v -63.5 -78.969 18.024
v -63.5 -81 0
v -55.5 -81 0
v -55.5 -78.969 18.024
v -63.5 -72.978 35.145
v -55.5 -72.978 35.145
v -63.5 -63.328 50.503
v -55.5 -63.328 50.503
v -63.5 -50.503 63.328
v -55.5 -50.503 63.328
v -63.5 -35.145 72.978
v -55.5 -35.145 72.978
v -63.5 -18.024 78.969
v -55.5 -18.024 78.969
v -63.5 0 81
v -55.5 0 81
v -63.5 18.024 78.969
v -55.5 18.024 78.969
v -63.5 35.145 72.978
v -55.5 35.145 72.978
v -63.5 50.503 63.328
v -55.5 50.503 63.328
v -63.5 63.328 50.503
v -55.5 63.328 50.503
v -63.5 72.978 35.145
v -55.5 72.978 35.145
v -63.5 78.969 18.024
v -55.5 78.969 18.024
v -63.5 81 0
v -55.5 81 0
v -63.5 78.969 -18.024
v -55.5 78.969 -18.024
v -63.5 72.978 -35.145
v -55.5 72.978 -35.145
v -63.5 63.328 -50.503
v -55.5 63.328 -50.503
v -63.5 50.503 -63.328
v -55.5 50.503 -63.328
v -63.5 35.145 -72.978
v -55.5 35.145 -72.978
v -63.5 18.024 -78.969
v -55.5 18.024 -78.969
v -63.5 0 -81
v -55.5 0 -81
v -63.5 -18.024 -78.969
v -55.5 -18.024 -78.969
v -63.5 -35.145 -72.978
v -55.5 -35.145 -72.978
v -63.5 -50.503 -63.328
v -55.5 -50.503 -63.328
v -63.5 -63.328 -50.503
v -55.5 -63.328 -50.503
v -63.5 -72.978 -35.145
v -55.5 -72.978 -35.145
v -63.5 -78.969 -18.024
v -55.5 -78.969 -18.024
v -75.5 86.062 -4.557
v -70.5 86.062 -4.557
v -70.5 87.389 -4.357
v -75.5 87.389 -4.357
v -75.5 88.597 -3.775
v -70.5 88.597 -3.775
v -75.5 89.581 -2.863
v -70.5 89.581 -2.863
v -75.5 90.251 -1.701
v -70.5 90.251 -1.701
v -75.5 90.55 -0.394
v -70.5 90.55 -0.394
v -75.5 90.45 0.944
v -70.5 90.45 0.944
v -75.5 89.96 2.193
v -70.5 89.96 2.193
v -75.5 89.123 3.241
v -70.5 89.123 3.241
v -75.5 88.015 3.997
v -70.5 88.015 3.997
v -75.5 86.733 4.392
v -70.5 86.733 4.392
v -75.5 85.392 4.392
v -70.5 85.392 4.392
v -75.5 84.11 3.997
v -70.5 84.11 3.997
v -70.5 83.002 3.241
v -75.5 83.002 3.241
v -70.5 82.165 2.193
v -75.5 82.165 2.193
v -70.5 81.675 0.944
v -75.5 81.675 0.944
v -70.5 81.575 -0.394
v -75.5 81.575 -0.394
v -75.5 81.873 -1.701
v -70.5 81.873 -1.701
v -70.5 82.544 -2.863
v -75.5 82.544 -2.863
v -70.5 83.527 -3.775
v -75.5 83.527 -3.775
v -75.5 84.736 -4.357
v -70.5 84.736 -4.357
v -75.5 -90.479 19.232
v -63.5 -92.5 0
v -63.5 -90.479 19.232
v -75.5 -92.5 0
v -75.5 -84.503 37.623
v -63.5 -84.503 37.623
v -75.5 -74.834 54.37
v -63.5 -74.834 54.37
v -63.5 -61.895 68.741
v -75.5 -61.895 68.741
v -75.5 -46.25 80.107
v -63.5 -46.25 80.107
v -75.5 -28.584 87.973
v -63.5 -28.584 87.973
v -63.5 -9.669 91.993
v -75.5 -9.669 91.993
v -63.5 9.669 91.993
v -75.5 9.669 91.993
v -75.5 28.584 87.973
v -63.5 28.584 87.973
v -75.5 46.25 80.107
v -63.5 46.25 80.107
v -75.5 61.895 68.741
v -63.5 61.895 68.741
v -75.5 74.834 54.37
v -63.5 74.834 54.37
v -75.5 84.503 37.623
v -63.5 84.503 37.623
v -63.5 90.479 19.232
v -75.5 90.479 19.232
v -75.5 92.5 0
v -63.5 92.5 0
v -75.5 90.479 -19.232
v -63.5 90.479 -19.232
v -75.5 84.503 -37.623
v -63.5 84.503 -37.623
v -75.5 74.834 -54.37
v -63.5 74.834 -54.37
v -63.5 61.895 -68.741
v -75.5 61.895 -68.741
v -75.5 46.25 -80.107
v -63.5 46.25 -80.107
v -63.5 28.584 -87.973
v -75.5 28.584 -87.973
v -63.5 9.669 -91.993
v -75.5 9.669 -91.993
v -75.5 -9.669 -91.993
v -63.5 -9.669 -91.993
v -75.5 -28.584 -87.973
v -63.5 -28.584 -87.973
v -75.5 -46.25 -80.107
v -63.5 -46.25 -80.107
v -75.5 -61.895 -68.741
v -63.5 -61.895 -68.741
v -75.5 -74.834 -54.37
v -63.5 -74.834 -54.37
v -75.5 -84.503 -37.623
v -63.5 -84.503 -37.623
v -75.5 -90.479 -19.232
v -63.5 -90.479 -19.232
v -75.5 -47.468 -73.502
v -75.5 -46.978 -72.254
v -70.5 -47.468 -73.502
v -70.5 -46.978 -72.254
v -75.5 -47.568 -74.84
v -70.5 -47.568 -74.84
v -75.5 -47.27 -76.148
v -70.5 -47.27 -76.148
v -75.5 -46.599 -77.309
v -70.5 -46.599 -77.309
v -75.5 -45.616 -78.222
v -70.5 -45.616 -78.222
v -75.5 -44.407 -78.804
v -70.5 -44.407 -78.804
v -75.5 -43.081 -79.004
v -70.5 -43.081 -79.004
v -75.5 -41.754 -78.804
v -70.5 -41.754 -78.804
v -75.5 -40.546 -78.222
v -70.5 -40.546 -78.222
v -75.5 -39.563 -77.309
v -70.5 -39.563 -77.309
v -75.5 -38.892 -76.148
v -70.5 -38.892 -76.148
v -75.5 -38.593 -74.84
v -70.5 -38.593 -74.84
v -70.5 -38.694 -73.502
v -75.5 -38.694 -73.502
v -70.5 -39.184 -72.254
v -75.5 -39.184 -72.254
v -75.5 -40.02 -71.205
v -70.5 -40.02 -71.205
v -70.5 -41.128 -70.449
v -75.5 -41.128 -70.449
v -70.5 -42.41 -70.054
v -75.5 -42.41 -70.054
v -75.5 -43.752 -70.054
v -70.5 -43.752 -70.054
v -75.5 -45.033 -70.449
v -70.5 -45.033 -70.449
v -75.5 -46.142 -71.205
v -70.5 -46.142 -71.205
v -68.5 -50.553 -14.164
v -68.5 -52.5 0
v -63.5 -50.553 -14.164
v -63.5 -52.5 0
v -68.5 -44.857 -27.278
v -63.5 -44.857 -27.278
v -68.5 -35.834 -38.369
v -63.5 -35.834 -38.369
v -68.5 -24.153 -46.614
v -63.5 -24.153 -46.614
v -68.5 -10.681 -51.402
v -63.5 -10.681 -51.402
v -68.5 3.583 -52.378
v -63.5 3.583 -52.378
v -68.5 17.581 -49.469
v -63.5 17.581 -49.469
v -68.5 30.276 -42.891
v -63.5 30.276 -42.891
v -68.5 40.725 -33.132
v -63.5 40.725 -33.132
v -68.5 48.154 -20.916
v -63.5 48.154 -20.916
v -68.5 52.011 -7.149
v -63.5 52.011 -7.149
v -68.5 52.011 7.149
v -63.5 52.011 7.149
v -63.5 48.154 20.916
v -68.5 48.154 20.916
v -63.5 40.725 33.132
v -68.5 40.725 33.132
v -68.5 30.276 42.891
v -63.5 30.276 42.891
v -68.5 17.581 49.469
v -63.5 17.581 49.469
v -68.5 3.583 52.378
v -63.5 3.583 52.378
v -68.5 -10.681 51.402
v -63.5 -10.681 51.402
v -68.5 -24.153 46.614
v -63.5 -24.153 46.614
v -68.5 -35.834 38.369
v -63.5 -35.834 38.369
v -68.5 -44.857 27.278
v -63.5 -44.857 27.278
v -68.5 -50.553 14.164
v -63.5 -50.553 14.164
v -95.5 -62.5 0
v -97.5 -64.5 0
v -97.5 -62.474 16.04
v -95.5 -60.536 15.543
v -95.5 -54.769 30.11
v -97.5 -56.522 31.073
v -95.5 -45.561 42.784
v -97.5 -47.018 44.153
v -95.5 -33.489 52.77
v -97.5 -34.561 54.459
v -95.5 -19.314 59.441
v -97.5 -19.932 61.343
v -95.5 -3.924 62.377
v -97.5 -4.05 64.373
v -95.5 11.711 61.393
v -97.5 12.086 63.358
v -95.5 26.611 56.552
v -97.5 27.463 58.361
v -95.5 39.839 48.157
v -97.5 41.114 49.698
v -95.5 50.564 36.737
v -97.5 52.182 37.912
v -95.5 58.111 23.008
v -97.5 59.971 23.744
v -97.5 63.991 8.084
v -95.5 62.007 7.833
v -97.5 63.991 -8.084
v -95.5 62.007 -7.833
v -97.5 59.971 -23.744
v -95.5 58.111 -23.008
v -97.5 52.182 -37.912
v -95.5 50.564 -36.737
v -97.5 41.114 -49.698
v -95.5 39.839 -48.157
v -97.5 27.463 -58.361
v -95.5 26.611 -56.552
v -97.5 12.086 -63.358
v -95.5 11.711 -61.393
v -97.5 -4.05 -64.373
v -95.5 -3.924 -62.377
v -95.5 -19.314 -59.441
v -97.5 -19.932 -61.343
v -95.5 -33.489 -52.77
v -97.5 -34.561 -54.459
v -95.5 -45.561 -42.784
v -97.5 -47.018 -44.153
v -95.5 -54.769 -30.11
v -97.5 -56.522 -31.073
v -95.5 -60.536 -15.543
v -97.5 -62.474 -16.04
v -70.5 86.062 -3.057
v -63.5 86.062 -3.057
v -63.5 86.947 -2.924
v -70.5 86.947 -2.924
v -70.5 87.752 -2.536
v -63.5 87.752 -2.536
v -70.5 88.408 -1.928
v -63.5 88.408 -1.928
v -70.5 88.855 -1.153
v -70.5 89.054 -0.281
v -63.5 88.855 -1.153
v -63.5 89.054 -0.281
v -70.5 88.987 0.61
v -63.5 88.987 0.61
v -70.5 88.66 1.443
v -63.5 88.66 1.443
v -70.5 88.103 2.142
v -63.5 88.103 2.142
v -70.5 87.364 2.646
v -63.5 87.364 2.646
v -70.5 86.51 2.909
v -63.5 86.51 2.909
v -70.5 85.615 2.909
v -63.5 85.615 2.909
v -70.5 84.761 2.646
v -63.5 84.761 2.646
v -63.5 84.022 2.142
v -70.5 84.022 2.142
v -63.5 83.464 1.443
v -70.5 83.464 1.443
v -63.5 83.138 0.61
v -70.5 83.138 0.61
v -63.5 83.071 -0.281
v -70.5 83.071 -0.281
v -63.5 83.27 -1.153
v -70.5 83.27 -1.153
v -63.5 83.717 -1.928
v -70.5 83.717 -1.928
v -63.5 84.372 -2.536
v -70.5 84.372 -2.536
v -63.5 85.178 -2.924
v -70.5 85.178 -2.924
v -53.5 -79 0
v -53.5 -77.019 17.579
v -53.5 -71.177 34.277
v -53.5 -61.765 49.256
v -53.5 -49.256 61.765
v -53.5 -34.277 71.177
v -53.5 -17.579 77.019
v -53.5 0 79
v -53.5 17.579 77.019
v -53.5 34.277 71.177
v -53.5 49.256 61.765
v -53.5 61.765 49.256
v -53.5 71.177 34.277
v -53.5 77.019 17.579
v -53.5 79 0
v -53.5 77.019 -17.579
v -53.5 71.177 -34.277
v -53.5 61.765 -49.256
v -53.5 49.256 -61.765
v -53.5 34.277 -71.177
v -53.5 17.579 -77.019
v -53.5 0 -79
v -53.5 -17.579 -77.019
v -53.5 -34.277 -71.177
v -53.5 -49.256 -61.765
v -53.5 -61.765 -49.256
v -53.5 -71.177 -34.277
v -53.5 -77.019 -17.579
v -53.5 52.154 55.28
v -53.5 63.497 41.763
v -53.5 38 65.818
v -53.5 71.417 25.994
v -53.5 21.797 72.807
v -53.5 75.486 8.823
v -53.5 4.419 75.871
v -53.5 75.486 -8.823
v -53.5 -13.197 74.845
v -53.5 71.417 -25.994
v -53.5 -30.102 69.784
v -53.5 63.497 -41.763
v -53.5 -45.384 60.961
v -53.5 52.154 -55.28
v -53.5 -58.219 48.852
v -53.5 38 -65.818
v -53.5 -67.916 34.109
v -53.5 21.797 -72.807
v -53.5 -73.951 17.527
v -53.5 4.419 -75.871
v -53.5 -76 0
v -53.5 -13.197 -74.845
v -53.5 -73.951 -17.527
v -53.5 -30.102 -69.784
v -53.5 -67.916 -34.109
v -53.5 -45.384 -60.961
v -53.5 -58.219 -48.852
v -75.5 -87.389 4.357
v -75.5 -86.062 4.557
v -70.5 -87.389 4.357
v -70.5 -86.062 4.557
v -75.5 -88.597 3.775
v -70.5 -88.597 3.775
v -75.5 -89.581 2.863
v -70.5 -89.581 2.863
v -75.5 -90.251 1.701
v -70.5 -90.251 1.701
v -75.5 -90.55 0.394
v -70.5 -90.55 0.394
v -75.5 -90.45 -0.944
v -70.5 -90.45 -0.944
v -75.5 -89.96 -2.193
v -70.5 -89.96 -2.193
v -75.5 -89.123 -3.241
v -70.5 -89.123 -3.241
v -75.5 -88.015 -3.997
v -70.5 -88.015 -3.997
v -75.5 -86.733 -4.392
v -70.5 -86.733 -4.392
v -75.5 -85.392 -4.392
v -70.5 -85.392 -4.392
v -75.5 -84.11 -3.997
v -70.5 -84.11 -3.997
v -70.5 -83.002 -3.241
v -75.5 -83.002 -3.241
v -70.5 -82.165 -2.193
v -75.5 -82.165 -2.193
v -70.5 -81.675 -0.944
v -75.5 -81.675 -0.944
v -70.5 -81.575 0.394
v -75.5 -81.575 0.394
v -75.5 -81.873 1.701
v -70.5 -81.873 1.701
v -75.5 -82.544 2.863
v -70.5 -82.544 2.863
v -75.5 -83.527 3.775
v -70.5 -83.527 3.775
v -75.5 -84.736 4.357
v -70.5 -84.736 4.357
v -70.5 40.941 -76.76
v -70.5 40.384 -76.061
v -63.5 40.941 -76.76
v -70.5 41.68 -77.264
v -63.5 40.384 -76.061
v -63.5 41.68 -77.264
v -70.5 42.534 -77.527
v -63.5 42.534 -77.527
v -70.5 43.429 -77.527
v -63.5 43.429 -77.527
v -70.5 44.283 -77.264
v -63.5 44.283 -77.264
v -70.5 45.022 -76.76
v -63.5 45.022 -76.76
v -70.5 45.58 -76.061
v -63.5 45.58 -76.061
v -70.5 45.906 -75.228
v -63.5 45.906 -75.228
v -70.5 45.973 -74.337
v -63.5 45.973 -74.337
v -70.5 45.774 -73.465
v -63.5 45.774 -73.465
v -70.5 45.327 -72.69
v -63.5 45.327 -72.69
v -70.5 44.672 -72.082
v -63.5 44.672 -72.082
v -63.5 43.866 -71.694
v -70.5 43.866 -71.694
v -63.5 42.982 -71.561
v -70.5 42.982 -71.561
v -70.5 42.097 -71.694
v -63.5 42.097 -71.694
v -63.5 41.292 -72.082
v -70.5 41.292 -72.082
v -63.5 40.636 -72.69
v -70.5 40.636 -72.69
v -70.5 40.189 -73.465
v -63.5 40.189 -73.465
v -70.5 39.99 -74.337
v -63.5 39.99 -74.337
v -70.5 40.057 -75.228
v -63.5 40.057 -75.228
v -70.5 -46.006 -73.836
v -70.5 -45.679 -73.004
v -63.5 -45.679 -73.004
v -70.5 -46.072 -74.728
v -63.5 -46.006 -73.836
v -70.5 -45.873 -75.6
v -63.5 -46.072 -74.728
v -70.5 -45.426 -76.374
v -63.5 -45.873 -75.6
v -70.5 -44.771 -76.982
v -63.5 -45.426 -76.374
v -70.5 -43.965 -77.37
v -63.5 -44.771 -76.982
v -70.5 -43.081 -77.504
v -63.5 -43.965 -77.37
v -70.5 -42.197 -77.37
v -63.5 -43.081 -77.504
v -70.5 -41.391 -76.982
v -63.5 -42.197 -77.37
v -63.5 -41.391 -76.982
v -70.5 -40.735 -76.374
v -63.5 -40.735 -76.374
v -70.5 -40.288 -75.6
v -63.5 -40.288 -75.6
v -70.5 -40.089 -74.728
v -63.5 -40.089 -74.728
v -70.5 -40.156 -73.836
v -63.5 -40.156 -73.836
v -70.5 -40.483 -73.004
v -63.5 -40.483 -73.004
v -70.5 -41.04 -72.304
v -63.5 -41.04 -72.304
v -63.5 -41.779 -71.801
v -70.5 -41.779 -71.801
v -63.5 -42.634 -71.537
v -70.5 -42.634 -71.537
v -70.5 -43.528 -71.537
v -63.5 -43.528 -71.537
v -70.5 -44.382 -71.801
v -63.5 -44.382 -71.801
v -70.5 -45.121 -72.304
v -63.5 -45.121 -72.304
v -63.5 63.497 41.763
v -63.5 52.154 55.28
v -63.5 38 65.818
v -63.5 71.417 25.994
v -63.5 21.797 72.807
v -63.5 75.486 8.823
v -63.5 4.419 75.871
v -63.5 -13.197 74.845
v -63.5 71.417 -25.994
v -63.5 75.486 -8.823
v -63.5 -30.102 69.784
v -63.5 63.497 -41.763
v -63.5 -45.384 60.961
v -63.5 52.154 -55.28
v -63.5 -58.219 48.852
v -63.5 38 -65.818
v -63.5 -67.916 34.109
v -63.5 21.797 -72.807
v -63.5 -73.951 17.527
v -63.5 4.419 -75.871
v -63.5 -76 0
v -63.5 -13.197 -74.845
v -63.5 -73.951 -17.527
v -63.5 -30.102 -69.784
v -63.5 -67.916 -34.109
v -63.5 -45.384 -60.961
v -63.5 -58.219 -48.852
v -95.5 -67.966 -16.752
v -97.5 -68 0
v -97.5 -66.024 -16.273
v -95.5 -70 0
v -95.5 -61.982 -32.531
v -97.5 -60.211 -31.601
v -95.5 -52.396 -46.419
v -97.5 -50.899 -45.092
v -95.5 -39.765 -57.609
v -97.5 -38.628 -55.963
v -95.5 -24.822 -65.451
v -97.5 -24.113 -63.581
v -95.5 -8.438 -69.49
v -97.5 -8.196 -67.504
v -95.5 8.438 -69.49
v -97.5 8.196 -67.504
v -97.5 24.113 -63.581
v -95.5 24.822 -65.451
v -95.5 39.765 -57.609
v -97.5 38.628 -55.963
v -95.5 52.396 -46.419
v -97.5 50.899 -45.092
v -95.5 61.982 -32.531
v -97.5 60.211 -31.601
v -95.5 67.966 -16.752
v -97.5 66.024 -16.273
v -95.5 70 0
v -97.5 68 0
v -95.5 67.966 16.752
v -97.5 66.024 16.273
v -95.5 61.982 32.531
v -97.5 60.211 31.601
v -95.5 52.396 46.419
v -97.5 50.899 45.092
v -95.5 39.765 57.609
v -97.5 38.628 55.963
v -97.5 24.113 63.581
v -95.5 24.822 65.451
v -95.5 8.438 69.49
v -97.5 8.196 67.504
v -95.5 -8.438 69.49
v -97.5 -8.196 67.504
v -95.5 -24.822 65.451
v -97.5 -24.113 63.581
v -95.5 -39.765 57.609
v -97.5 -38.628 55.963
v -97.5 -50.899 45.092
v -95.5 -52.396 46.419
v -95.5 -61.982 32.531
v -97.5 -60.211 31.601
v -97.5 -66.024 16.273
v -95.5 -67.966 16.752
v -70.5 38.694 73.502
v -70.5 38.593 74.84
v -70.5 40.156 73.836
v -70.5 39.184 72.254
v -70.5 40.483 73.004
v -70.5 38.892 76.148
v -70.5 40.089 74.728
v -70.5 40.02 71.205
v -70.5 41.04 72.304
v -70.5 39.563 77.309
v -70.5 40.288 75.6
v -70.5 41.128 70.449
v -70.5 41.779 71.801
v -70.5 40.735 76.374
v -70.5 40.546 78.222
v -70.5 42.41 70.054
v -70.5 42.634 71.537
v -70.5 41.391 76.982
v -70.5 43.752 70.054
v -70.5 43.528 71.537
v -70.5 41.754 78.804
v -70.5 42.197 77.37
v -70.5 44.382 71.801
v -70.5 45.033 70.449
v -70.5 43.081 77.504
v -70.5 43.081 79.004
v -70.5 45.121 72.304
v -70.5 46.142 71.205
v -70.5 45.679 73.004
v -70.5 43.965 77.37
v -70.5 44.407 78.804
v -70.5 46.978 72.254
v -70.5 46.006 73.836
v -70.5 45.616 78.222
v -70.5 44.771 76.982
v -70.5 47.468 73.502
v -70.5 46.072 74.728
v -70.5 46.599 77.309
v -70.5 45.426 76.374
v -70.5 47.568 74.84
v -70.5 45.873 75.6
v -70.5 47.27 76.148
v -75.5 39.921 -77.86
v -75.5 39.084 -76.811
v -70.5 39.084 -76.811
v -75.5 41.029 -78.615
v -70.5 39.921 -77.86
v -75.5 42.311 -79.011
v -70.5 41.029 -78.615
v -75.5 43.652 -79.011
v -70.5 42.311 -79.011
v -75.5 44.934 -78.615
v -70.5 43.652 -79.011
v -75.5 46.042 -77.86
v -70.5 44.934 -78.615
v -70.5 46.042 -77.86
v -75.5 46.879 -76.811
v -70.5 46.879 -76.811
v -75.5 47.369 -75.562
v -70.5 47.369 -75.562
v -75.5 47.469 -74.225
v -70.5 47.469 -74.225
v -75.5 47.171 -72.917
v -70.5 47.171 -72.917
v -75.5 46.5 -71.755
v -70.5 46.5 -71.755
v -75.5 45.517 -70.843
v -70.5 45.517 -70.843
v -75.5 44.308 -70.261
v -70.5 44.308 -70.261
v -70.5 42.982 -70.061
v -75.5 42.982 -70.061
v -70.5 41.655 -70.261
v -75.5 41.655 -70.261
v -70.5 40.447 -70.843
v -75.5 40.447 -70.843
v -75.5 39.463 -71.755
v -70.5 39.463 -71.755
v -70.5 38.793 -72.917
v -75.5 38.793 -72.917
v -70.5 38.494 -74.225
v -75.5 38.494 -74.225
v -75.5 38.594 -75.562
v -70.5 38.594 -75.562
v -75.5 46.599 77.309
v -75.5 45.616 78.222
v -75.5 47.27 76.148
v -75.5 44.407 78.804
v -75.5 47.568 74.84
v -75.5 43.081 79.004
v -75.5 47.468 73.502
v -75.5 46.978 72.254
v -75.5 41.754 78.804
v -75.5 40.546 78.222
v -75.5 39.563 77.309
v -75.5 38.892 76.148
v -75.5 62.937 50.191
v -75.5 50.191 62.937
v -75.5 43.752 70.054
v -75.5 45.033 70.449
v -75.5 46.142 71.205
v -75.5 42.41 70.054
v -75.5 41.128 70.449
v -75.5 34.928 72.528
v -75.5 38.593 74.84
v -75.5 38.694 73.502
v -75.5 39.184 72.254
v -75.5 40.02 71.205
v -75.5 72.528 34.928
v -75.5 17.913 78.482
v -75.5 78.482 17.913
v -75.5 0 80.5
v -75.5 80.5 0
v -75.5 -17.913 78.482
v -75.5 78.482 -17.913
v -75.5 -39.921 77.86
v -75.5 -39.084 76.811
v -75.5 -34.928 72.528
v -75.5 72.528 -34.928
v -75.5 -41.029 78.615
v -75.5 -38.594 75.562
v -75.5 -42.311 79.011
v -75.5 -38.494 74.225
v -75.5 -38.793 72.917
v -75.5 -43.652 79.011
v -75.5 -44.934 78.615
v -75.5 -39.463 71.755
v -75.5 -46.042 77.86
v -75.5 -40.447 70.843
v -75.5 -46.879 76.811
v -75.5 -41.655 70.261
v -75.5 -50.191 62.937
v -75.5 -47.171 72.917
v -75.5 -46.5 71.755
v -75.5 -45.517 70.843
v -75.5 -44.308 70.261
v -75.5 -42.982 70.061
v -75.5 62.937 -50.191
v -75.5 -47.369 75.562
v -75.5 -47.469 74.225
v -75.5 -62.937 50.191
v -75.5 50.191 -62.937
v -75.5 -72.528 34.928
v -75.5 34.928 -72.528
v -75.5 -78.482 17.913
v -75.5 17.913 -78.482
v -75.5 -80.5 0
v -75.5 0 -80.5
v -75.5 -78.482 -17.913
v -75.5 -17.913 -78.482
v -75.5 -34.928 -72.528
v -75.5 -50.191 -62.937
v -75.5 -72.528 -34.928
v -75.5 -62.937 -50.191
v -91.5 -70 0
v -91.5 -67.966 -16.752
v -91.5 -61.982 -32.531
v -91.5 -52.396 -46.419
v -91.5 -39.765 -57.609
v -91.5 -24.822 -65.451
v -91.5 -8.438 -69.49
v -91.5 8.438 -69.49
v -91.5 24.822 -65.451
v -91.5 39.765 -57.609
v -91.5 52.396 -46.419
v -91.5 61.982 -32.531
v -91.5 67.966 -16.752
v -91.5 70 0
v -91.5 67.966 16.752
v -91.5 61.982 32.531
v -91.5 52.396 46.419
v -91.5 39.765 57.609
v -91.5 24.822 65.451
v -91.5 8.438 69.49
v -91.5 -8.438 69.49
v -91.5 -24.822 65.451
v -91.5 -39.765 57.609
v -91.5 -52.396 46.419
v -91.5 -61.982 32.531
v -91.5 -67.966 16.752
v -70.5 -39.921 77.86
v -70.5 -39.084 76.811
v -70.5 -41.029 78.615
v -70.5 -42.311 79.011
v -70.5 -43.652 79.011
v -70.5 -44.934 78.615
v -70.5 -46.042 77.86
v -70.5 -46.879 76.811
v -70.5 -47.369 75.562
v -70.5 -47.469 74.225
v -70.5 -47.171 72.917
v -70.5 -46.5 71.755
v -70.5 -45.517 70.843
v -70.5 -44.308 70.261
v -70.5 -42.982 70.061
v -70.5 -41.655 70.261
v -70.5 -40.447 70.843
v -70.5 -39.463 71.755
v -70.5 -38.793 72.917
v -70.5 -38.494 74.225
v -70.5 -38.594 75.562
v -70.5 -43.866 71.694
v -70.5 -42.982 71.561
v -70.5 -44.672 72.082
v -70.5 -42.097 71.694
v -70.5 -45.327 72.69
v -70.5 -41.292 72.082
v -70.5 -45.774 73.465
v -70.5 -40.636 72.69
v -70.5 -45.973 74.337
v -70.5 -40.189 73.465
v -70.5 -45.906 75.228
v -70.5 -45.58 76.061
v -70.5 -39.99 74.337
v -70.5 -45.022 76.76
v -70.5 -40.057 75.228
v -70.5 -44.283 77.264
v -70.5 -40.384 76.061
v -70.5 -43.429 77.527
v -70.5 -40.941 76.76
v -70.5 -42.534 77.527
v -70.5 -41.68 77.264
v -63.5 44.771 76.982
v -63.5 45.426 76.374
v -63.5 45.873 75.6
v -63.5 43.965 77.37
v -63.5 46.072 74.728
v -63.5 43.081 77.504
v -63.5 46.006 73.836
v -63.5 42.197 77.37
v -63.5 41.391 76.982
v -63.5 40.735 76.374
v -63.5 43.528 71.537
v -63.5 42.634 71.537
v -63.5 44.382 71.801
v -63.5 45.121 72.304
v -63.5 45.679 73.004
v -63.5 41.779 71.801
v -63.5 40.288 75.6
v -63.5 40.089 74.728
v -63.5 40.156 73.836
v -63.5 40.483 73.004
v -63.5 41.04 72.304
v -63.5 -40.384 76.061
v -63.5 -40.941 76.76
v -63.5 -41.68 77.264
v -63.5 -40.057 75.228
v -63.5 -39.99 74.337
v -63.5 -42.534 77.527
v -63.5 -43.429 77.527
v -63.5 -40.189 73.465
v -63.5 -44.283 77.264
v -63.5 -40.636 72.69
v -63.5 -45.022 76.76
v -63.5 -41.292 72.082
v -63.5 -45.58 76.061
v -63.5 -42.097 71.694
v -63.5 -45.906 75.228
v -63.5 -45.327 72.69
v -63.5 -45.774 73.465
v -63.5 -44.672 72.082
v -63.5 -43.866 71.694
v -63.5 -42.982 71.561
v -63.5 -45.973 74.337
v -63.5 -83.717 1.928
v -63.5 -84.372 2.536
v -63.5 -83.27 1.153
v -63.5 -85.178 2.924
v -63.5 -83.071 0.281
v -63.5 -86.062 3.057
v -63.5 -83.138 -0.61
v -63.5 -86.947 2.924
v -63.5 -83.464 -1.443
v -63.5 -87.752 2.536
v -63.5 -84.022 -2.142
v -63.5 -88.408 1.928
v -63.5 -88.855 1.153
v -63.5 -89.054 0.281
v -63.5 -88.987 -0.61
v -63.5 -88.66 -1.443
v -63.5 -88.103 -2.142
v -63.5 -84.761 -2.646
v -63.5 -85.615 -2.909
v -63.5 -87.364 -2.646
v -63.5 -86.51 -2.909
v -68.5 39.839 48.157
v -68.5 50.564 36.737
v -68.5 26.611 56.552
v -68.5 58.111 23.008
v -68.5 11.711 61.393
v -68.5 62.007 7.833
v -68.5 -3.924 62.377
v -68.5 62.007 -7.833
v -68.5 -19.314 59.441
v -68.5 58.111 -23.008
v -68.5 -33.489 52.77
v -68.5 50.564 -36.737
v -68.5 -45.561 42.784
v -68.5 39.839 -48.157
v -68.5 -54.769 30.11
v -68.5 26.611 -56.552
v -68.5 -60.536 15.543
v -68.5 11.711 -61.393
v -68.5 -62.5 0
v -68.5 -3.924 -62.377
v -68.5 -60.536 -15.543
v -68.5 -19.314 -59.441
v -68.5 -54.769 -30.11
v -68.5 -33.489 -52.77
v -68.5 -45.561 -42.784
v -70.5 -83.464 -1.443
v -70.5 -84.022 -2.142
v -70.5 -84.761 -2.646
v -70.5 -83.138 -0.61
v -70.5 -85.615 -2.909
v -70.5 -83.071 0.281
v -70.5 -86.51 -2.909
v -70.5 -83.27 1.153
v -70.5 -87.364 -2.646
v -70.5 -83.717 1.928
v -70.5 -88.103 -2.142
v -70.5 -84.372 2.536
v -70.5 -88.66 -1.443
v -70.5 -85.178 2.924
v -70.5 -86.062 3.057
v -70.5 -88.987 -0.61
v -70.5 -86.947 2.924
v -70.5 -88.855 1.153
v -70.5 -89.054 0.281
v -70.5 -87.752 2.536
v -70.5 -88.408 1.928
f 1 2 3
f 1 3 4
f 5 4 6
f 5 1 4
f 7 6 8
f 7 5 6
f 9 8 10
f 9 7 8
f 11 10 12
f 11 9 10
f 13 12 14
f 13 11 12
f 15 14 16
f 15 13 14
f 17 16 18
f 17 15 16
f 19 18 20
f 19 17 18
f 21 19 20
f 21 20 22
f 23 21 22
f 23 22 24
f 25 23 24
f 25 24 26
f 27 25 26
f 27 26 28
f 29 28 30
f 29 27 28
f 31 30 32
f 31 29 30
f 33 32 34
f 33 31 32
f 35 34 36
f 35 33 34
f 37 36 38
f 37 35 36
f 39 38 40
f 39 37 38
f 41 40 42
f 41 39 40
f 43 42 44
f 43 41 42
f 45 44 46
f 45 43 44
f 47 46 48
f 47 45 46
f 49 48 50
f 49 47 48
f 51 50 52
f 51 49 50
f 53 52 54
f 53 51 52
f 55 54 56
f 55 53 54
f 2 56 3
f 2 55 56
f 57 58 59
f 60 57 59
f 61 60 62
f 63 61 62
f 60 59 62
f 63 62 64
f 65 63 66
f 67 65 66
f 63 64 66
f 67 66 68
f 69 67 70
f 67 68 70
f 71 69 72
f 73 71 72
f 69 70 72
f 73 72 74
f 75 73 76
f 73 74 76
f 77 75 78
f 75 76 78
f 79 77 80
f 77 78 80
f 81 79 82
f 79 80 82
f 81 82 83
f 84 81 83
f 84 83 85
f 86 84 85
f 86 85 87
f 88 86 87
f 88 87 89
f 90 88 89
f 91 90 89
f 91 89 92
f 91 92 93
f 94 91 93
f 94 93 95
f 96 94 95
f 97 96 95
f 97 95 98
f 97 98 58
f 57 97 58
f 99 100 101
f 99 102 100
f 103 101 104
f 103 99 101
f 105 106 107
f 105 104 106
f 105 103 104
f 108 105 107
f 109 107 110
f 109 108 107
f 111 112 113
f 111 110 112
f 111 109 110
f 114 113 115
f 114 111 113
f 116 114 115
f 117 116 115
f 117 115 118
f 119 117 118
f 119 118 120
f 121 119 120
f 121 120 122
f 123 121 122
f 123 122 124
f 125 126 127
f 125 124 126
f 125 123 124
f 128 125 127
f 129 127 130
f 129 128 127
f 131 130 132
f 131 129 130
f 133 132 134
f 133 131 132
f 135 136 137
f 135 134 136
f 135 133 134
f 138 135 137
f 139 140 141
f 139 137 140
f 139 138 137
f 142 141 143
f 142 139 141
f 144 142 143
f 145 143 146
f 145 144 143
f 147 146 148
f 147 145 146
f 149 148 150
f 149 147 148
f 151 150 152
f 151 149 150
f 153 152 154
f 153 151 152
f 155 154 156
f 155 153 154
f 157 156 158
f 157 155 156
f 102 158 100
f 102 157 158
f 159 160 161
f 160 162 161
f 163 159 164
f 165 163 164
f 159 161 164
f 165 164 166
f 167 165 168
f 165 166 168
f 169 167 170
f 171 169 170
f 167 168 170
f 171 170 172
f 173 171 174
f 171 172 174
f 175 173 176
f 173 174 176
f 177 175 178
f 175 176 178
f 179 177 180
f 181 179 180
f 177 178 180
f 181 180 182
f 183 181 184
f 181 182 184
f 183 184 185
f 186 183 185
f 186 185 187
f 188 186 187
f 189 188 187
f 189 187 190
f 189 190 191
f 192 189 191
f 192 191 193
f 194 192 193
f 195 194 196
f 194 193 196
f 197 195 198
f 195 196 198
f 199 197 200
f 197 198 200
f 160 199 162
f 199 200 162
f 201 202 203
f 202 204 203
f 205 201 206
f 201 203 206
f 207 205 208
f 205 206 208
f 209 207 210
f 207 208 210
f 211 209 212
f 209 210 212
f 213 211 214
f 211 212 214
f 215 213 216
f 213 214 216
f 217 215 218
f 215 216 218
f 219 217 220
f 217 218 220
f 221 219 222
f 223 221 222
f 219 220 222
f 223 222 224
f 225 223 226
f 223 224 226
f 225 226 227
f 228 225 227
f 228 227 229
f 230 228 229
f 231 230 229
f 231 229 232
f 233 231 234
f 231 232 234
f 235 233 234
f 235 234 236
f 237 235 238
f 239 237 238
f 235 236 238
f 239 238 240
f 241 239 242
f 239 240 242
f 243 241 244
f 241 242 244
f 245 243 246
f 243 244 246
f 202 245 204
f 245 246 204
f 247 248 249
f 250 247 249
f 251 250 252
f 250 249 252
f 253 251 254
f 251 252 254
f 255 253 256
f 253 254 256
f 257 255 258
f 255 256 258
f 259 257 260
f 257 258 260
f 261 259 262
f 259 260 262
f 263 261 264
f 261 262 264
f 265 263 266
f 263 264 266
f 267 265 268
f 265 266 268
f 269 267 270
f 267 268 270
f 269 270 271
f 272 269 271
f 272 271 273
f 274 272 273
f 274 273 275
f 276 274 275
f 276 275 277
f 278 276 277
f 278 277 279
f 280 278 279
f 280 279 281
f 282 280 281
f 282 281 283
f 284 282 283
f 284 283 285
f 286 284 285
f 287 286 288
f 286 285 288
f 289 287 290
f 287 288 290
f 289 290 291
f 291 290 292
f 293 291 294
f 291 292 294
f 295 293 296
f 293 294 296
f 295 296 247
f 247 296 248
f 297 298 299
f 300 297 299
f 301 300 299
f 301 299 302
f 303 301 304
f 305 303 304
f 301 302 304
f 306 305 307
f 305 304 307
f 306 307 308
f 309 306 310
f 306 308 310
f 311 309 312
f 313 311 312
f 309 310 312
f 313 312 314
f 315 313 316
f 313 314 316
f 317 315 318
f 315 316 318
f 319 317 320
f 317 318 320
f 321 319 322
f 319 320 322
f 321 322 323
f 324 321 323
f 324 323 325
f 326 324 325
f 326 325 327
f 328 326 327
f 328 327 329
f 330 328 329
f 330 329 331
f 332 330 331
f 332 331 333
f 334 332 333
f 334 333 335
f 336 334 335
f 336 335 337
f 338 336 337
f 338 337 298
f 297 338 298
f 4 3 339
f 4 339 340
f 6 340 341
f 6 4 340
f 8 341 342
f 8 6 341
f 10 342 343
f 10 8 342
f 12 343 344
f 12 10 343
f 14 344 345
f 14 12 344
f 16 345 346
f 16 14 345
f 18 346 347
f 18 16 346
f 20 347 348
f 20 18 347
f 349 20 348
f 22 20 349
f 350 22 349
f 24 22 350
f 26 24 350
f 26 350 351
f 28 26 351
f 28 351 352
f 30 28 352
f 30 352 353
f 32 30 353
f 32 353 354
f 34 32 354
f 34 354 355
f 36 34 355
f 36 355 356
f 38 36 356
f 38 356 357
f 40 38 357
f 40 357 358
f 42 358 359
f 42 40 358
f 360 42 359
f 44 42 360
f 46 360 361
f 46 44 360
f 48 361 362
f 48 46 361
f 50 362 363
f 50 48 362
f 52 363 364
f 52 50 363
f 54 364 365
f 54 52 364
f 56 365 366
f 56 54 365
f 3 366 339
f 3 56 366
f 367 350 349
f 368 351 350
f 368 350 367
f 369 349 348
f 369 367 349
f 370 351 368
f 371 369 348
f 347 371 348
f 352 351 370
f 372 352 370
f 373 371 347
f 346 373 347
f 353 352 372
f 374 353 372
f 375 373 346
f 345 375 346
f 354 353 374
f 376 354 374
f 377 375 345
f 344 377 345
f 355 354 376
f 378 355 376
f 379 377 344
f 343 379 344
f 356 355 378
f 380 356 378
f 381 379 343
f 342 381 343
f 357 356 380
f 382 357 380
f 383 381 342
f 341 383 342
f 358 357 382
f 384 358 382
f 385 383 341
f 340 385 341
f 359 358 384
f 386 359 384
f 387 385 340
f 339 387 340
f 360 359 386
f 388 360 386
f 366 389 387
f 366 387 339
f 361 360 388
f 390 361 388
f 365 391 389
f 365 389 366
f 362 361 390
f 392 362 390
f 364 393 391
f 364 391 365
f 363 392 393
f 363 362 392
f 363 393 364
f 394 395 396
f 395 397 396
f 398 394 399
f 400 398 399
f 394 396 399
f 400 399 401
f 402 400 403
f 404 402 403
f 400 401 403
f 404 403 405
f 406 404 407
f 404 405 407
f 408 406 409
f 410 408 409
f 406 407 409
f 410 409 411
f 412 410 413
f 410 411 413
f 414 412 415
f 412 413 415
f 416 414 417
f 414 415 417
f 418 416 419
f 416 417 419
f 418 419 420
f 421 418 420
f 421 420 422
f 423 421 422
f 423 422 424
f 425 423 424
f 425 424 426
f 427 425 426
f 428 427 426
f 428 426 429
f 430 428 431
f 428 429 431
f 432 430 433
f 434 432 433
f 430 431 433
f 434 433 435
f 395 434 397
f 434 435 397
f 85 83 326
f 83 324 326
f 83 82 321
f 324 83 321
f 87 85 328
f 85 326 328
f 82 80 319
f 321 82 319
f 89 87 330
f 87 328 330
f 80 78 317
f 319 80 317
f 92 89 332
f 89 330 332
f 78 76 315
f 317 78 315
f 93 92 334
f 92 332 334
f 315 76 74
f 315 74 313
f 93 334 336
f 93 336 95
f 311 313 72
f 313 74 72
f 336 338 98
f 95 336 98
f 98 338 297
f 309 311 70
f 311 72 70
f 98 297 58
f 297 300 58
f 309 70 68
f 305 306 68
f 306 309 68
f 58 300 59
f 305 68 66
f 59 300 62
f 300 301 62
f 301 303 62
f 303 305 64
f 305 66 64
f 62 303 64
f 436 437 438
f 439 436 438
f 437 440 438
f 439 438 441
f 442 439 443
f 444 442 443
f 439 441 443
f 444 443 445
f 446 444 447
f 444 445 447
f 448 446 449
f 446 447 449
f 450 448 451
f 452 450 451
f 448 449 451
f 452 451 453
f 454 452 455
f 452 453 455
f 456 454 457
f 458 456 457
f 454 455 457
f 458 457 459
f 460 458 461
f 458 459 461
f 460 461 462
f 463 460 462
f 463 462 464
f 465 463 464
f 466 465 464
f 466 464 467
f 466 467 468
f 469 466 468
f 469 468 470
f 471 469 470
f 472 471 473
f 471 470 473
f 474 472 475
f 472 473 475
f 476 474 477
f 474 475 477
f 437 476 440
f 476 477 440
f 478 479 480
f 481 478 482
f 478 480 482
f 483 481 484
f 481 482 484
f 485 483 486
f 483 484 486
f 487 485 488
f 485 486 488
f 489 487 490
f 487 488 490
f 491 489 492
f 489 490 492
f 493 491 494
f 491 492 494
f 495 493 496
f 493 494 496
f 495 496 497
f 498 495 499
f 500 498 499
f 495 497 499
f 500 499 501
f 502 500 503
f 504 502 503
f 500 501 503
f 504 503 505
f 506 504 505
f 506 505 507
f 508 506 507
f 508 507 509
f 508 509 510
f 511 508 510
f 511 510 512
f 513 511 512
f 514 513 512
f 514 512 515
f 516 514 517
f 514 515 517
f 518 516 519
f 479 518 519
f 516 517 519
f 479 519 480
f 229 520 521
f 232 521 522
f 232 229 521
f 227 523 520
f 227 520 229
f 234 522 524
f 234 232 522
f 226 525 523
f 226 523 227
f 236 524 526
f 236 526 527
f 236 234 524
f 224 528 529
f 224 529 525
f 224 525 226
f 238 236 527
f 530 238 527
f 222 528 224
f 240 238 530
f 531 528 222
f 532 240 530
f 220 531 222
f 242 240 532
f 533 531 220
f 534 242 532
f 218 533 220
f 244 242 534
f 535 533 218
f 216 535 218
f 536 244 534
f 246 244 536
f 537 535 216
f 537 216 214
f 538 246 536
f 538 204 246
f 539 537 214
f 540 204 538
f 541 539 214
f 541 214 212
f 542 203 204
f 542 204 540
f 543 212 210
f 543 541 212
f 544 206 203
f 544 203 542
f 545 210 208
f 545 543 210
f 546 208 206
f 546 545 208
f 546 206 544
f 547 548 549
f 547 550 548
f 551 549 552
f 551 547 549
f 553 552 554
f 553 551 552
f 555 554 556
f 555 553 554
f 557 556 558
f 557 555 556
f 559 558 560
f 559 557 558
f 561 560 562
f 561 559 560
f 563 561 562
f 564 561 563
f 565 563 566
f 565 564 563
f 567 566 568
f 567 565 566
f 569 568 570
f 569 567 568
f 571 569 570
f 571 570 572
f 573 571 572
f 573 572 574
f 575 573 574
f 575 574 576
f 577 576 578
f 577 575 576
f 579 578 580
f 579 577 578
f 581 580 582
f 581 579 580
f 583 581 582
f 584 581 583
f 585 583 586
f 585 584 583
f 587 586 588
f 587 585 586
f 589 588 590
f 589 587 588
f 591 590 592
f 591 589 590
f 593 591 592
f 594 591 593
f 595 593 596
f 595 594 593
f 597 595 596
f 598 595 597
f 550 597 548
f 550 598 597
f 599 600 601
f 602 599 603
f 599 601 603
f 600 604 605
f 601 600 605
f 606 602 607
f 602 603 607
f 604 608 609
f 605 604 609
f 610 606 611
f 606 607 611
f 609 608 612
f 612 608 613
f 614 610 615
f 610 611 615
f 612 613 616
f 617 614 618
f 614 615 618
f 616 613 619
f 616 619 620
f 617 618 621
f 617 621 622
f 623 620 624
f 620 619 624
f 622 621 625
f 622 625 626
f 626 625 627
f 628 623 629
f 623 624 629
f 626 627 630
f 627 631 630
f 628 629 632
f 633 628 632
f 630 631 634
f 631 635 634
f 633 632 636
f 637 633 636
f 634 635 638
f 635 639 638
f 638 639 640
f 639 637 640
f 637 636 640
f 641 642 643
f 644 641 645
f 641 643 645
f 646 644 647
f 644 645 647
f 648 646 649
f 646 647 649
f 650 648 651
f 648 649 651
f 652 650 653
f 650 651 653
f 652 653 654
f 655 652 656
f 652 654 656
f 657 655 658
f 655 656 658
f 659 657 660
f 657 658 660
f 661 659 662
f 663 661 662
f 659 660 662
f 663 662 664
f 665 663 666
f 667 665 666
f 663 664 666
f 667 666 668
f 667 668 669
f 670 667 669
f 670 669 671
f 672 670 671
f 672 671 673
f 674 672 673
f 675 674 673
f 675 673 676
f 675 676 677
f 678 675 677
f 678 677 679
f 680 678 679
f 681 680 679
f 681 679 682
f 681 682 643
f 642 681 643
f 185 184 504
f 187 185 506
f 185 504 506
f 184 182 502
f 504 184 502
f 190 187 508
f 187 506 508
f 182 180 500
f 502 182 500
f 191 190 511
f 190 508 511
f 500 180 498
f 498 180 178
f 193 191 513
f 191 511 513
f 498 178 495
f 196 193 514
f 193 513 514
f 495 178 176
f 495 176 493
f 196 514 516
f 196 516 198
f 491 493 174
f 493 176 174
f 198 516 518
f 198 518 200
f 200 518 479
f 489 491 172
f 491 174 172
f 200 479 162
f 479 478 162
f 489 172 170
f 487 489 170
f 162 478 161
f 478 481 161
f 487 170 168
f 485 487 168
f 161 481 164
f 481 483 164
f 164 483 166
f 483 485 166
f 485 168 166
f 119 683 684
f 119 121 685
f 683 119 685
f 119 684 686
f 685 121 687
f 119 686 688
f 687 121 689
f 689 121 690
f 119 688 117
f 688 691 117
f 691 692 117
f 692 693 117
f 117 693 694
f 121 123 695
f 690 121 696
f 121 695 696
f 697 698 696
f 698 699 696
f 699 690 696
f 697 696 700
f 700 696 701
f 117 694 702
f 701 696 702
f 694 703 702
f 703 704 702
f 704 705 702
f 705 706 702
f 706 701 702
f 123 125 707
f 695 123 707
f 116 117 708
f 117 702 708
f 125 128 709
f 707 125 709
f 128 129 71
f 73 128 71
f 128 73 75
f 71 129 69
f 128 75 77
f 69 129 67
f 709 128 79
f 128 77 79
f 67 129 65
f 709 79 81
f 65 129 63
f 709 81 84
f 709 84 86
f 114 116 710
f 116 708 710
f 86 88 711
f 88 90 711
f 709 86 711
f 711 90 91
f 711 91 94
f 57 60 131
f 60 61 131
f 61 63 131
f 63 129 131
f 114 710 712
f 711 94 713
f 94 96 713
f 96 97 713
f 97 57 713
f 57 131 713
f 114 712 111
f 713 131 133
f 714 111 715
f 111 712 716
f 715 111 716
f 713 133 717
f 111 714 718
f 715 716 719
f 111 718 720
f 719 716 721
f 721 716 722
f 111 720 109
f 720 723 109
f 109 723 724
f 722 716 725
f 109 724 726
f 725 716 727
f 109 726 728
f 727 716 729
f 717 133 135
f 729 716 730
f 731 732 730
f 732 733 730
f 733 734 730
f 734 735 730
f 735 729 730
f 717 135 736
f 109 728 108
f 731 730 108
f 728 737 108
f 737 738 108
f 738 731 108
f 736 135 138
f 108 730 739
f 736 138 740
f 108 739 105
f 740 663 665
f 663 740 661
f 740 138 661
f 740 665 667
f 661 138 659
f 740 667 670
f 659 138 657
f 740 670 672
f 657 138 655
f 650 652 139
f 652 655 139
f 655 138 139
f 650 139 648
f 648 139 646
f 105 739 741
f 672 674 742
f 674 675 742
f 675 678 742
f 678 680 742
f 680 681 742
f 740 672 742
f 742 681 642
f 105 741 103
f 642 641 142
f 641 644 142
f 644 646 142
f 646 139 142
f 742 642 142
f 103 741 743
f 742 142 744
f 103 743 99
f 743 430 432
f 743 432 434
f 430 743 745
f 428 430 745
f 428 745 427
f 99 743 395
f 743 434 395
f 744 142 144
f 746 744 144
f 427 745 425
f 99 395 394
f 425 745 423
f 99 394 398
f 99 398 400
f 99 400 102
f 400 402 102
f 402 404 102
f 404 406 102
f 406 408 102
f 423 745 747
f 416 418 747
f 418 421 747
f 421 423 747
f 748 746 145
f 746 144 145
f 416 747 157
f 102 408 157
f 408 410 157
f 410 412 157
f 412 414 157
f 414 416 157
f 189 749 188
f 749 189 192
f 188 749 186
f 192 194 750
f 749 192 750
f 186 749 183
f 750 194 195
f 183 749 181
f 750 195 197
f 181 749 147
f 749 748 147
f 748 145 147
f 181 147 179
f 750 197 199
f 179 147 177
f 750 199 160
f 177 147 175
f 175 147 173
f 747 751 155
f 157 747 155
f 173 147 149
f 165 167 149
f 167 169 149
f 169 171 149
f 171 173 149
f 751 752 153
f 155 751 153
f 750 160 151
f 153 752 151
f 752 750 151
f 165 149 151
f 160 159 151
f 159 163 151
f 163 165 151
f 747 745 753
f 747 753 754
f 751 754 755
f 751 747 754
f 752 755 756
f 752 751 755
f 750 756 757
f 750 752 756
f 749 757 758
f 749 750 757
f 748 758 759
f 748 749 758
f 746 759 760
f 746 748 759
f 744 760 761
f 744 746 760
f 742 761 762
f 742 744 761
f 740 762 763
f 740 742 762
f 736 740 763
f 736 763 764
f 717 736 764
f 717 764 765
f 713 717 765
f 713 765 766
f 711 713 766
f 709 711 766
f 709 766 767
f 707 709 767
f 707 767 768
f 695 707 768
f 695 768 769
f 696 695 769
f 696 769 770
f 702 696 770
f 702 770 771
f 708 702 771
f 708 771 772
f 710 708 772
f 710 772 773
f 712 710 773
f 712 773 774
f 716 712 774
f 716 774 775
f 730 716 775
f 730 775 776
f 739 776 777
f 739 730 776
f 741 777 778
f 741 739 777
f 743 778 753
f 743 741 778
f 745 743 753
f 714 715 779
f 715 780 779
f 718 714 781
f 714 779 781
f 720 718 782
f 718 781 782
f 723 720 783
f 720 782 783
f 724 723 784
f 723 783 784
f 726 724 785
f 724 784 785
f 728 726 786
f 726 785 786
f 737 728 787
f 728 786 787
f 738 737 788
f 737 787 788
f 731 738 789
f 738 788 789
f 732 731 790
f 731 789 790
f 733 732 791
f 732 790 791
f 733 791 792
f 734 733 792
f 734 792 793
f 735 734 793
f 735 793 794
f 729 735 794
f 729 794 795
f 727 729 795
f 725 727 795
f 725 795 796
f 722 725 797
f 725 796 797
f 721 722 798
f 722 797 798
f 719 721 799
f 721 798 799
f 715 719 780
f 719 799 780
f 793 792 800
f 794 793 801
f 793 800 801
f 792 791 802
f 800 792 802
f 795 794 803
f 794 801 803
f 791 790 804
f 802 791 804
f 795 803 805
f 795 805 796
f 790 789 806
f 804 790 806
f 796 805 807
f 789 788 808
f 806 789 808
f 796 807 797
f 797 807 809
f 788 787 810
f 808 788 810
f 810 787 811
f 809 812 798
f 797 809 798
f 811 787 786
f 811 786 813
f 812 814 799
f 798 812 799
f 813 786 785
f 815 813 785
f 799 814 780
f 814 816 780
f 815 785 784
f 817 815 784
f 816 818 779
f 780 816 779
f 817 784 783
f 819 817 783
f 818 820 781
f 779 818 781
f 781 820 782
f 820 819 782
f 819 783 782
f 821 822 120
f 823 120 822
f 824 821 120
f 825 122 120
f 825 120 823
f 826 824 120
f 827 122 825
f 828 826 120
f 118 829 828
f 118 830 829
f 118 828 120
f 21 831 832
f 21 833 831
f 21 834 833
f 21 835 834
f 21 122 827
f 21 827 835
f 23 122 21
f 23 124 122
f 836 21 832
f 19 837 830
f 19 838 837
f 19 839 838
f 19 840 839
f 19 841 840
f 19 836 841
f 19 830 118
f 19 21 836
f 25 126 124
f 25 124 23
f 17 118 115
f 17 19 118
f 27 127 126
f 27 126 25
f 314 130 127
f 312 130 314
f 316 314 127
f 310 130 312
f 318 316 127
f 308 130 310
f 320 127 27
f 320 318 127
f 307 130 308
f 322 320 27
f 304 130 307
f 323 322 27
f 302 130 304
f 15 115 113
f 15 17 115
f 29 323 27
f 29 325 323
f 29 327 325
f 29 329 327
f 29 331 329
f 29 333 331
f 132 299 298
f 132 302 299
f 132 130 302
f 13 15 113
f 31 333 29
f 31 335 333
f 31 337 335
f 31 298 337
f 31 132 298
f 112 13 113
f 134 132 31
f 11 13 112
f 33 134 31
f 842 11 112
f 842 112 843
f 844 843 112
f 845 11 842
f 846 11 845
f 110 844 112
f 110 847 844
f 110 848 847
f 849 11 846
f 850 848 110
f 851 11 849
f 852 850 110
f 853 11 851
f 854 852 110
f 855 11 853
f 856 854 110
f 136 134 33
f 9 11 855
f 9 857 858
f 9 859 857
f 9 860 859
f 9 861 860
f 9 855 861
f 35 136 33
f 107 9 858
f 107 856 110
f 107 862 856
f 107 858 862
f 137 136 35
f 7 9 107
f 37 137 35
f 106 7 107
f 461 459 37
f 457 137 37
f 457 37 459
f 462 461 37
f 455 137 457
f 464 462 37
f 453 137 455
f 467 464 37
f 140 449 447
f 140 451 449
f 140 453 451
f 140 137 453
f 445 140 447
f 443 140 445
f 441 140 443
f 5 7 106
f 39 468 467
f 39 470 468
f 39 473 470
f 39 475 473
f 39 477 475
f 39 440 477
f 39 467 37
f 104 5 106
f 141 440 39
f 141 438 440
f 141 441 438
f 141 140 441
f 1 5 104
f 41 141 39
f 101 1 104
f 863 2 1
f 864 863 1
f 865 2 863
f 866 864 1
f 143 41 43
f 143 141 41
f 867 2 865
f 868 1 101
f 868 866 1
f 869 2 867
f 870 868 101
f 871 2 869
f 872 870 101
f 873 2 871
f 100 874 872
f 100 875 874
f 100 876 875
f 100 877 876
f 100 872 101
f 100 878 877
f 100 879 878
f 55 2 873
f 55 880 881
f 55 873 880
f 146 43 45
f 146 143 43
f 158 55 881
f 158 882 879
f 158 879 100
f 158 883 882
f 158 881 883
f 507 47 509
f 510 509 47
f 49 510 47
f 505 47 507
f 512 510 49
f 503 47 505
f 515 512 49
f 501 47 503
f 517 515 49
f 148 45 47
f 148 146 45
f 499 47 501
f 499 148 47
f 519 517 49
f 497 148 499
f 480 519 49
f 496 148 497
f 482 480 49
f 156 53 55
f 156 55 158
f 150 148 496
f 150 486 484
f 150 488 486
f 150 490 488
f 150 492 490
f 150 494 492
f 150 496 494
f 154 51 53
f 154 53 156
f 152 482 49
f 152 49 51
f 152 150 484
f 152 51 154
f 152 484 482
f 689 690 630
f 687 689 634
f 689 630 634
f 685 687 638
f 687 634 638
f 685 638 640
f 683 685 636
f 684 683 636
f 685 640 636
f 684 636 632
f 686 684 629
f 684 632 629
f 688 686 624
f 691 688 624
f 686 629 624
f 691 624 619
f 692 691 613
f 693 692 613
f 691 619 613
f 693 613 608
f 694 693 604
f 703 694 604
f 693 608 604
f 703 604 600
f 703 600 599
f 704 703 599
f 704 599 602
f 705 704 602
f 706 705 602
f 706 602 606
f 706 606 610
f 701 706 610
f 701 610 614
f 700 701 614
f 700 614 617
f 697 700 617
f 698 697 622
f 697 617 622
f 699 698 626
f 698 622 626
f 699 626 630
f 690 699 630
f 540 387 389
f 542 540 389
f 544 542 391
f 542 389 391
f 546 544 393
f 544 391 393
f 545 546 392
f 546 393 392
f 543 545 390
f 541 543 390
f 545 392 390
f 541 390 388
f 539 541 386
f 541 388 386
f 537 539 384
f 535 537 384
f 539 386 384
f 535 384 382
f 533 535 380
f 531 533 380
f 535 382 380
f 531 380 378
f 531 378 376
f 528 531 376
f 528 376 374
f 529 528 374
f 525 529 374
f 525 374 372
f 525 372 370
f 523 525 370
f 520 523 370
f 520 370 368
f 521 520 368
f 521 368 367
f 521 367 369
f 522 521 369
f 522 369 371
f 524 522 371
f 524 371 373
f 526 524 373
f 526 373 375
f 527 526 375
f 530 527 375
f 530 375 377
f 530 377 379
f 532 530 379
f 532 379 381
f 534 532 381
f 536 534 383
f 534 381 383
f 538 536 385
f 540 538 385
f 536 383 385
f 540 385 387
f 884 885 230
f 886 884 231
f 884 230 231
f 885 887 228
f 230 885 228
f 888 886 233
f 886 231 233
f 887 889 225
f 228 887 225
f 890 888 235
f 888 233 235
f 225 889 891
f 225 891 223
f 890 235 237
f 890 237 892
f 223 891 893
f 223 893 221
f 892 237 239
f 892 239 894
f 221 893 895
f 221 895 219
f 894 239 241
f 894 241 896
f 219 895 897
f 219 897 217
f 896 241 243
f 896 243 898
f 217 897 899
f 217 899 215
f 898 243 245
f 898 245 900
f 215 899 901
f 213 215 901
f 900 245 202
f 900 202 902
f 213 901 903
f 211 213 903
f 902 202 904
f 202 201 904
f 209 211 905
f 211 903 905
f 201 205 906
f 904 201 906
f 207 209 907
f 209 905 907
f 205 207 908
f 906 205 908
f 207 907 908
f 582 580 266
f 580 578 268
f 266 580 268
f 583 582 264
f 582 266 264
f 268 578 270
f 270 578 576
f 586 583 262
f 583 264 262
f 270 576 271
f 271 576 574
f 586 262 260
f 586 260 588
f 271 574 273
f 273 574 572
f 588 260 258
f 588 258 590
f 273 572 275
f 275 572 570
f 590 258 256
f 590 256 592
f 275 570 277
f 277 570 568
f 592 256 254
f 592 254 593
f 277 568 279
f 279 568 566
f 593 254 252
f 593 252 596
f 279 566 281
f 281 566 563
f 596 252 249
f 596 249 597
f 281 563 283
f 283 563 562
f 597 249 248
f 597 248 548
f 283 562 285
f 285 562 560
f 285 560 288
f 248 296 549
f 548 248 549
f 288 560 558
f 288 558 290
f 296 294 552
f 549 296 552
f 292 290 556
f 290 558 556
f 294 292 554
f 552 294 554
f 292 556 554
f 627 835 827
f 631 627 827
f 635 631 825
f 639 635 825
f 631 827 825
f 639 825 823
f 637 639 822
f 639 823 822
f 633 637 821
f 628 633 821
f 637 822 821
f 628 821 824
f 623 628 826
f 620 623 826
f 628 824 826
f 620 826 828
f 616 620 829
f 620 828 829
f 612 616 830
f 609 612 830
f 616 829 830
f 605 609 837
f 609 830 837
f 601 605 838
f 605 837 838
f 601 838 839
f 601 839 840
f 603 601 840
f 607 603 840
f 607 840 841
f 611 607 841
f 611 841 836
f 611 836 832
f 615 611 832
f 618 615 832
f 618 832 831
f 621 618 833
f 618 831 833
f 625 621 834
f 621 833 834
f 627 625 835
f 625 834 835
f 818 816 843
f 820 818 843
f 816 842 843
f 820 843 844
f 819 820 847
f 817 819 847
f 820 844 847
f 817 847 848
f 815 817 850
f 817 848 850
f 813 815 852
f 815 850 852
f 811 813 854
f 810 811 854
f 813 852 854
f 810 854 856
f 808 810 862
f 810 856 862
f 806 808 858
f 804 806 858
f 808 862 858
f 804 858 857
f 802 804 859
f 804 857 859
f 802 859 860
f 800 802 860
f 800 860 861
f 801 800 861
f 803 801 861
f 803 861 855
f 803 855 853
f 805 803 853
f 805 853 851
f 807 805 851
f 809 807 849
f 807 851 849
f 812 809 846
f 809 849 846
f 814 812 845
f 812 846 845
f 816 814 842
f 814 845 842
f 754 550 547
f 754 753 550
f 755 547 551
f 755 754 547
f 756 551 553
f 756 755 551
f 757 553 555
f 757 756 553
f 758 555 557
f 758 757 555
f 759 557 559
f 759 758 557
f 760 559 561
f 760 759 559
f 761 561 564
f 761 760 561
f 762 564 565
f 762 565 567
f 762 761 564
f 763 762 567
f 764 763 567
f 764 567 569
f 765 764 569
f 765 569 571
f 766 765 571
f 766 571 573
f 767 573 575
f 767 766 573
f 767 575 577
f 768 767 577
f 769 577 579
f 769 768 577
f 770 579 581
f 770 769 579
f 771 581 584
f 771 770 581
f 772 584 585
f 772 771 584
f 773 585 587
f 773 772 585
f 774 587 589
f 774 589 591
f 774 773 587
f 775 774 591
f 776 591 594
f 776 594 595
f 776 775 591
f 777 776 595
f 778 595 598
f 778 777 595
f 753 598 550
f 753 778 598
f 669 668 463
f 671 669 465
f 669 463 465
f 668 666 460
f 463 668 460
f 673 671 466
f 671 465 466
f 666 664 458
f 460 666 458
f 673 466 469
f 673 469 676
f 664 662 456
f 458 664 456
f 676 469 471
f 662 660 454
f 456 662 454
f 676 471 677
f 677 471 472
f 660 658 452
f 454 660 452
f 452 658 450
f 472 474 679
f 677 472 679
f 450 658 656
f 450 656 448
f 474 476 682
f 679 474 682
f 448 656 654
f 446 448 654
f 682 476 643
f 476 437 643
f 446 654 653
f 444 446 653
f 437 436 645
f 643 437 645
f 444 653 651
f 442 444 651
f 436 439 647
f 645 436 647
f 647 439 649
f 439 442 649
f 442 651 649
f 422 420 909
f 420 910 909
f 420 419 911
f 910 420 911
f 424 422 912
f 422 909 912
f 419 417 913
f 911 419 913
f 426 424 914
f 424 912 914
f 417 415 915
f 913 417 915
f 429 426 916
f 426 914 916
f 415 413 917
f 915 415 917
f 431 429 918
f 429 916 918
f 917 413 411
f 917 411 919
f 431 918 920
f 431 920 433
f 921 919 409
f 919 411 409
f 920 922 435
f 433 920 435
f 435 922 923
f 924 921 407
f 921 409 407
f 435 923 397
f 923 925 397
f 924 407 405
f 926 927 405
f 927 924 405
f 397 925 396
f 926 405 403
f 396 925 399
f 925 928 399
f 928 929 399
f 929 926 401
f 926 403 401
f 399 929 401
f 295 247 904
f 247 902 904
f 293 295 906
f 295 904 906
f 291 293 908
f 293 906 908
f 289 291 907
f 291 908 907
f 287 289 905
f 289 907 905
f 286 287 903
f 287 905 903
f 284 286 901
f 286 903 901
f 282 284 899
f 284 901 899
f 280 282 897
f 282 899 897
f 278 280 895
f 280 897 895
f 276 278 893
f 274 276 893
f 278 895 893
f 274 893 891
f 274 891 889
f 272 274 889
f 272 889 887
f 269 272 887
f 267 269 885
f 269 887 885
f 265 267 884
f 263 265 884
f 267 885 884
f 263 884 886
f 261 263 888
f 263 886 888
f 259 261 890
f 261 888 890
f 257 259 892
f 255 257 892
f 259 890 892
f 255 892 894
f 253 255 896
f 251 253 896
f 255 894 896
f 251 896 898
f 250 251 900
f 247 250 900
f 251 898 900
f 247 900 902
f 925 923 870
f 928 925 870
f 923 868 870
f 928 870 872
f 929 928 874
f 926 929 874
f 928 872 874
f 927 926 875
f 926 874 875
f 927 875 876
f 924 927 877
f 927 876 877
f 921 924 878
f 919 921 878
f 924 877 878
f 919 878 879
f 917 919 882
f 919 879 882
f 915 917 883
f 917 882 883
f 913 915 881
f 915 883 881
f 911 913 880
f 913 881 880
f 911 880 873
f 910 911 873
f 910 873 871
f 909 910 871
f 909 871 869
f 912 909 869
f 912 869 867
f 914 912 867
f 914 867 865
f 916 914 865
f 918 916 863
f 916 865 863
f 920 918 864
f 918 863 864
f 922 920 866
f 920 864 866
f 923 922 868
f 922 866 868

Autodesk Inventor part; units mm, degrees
ref_plane "YZ Plane" through (0, 0, 0) normal (1, 0, 0) x (0, 1, 0)
ref_plane "XZ Plane" through (0, 0, 0) normal (0, 1, 0) x (-1, 0, 0)
ref_plane "XY Plane" through (0, 0, 0) normal (0, 0, 1) x (1, 0, 0)
sketch "Эскиз1" plane through (0, 0, 0) normal (0, 0, 1) x (1, 0, 0)
  line L0 (-63.5, -92.5) -> (-63.5, -81)
  line L1 (-63.5, -81) -> (-63.5, -92.5)
  line L2 (-75.5, -92.5) -> (-75.5, -80.5)
  line L3 (-97.5, -62.5) -> (-68.5, -62.5)
  line L4 (-68.5, -62.5) -> (-68.5, -52.5)
  line L5 (-68.5, -52.5) -> (-63.5, -52.5)
  line L6 (-63.5, -52.5) -> (-63.5, -76)
  line L7 (-63.5, -76) -> (-53.5, -76)
  line L8 (-53.5, -76) -> (-53.5, -81)
  line L9 (-63.5, -92.5) -> (-75.5, -92.5)
  line L10 (-53.5, -81) -> (-63.5, -81)
  line L11 (-97.5, -70) -> (-91.5, -70)
  line L12 (-91.5, -70) -> (-75.5, -80.5)
  line L13 (-97.5, -62.5) -> (-97.5, -70)
  line L14 (-117, 0) -> (19.5, 0) projected
  point P0 (0, 0)
  dimension "d0" = 12
  dimension "d1" = 5
  dimension "d2" = 10
  dimension "d3" = 30
  dimension "d5" = 12
  dimension "d7" = 10
  dimension "d8" = 6
  dimension "d9" = 5
  dimension "d10" = 7.5
  dimension "d11" = 22
  dimension "d13" = 70
revolve "Вращение1" add sketch "Эскиз1" angle 360 about axis through (-10, 0, 0) along (1, 0, 0)
chamfer "Фаска1" distance 2 angle 45 1 edges at (-97.5, 70, 0)
chamfer "Фаска2" distance 2 angle 45 1 edges at (-97.5, 62.5, 0)
chamfer "Фаска3" distance 2 angle 45 1 edges at (-53.5, 81, 0)
hole "Отверстие2" at (-75.5, -86.0624, 0.0573) direction (1, 0, 0) diameter 6 end through all counterbore diameter 9 counterbore depth 5
pattern_circular "Круговой массив2" count 6 over 360 about axis through (-10, 0, 0) along (1, 0, 0) of "Отверстие2"
properties part number "2 крышка"
